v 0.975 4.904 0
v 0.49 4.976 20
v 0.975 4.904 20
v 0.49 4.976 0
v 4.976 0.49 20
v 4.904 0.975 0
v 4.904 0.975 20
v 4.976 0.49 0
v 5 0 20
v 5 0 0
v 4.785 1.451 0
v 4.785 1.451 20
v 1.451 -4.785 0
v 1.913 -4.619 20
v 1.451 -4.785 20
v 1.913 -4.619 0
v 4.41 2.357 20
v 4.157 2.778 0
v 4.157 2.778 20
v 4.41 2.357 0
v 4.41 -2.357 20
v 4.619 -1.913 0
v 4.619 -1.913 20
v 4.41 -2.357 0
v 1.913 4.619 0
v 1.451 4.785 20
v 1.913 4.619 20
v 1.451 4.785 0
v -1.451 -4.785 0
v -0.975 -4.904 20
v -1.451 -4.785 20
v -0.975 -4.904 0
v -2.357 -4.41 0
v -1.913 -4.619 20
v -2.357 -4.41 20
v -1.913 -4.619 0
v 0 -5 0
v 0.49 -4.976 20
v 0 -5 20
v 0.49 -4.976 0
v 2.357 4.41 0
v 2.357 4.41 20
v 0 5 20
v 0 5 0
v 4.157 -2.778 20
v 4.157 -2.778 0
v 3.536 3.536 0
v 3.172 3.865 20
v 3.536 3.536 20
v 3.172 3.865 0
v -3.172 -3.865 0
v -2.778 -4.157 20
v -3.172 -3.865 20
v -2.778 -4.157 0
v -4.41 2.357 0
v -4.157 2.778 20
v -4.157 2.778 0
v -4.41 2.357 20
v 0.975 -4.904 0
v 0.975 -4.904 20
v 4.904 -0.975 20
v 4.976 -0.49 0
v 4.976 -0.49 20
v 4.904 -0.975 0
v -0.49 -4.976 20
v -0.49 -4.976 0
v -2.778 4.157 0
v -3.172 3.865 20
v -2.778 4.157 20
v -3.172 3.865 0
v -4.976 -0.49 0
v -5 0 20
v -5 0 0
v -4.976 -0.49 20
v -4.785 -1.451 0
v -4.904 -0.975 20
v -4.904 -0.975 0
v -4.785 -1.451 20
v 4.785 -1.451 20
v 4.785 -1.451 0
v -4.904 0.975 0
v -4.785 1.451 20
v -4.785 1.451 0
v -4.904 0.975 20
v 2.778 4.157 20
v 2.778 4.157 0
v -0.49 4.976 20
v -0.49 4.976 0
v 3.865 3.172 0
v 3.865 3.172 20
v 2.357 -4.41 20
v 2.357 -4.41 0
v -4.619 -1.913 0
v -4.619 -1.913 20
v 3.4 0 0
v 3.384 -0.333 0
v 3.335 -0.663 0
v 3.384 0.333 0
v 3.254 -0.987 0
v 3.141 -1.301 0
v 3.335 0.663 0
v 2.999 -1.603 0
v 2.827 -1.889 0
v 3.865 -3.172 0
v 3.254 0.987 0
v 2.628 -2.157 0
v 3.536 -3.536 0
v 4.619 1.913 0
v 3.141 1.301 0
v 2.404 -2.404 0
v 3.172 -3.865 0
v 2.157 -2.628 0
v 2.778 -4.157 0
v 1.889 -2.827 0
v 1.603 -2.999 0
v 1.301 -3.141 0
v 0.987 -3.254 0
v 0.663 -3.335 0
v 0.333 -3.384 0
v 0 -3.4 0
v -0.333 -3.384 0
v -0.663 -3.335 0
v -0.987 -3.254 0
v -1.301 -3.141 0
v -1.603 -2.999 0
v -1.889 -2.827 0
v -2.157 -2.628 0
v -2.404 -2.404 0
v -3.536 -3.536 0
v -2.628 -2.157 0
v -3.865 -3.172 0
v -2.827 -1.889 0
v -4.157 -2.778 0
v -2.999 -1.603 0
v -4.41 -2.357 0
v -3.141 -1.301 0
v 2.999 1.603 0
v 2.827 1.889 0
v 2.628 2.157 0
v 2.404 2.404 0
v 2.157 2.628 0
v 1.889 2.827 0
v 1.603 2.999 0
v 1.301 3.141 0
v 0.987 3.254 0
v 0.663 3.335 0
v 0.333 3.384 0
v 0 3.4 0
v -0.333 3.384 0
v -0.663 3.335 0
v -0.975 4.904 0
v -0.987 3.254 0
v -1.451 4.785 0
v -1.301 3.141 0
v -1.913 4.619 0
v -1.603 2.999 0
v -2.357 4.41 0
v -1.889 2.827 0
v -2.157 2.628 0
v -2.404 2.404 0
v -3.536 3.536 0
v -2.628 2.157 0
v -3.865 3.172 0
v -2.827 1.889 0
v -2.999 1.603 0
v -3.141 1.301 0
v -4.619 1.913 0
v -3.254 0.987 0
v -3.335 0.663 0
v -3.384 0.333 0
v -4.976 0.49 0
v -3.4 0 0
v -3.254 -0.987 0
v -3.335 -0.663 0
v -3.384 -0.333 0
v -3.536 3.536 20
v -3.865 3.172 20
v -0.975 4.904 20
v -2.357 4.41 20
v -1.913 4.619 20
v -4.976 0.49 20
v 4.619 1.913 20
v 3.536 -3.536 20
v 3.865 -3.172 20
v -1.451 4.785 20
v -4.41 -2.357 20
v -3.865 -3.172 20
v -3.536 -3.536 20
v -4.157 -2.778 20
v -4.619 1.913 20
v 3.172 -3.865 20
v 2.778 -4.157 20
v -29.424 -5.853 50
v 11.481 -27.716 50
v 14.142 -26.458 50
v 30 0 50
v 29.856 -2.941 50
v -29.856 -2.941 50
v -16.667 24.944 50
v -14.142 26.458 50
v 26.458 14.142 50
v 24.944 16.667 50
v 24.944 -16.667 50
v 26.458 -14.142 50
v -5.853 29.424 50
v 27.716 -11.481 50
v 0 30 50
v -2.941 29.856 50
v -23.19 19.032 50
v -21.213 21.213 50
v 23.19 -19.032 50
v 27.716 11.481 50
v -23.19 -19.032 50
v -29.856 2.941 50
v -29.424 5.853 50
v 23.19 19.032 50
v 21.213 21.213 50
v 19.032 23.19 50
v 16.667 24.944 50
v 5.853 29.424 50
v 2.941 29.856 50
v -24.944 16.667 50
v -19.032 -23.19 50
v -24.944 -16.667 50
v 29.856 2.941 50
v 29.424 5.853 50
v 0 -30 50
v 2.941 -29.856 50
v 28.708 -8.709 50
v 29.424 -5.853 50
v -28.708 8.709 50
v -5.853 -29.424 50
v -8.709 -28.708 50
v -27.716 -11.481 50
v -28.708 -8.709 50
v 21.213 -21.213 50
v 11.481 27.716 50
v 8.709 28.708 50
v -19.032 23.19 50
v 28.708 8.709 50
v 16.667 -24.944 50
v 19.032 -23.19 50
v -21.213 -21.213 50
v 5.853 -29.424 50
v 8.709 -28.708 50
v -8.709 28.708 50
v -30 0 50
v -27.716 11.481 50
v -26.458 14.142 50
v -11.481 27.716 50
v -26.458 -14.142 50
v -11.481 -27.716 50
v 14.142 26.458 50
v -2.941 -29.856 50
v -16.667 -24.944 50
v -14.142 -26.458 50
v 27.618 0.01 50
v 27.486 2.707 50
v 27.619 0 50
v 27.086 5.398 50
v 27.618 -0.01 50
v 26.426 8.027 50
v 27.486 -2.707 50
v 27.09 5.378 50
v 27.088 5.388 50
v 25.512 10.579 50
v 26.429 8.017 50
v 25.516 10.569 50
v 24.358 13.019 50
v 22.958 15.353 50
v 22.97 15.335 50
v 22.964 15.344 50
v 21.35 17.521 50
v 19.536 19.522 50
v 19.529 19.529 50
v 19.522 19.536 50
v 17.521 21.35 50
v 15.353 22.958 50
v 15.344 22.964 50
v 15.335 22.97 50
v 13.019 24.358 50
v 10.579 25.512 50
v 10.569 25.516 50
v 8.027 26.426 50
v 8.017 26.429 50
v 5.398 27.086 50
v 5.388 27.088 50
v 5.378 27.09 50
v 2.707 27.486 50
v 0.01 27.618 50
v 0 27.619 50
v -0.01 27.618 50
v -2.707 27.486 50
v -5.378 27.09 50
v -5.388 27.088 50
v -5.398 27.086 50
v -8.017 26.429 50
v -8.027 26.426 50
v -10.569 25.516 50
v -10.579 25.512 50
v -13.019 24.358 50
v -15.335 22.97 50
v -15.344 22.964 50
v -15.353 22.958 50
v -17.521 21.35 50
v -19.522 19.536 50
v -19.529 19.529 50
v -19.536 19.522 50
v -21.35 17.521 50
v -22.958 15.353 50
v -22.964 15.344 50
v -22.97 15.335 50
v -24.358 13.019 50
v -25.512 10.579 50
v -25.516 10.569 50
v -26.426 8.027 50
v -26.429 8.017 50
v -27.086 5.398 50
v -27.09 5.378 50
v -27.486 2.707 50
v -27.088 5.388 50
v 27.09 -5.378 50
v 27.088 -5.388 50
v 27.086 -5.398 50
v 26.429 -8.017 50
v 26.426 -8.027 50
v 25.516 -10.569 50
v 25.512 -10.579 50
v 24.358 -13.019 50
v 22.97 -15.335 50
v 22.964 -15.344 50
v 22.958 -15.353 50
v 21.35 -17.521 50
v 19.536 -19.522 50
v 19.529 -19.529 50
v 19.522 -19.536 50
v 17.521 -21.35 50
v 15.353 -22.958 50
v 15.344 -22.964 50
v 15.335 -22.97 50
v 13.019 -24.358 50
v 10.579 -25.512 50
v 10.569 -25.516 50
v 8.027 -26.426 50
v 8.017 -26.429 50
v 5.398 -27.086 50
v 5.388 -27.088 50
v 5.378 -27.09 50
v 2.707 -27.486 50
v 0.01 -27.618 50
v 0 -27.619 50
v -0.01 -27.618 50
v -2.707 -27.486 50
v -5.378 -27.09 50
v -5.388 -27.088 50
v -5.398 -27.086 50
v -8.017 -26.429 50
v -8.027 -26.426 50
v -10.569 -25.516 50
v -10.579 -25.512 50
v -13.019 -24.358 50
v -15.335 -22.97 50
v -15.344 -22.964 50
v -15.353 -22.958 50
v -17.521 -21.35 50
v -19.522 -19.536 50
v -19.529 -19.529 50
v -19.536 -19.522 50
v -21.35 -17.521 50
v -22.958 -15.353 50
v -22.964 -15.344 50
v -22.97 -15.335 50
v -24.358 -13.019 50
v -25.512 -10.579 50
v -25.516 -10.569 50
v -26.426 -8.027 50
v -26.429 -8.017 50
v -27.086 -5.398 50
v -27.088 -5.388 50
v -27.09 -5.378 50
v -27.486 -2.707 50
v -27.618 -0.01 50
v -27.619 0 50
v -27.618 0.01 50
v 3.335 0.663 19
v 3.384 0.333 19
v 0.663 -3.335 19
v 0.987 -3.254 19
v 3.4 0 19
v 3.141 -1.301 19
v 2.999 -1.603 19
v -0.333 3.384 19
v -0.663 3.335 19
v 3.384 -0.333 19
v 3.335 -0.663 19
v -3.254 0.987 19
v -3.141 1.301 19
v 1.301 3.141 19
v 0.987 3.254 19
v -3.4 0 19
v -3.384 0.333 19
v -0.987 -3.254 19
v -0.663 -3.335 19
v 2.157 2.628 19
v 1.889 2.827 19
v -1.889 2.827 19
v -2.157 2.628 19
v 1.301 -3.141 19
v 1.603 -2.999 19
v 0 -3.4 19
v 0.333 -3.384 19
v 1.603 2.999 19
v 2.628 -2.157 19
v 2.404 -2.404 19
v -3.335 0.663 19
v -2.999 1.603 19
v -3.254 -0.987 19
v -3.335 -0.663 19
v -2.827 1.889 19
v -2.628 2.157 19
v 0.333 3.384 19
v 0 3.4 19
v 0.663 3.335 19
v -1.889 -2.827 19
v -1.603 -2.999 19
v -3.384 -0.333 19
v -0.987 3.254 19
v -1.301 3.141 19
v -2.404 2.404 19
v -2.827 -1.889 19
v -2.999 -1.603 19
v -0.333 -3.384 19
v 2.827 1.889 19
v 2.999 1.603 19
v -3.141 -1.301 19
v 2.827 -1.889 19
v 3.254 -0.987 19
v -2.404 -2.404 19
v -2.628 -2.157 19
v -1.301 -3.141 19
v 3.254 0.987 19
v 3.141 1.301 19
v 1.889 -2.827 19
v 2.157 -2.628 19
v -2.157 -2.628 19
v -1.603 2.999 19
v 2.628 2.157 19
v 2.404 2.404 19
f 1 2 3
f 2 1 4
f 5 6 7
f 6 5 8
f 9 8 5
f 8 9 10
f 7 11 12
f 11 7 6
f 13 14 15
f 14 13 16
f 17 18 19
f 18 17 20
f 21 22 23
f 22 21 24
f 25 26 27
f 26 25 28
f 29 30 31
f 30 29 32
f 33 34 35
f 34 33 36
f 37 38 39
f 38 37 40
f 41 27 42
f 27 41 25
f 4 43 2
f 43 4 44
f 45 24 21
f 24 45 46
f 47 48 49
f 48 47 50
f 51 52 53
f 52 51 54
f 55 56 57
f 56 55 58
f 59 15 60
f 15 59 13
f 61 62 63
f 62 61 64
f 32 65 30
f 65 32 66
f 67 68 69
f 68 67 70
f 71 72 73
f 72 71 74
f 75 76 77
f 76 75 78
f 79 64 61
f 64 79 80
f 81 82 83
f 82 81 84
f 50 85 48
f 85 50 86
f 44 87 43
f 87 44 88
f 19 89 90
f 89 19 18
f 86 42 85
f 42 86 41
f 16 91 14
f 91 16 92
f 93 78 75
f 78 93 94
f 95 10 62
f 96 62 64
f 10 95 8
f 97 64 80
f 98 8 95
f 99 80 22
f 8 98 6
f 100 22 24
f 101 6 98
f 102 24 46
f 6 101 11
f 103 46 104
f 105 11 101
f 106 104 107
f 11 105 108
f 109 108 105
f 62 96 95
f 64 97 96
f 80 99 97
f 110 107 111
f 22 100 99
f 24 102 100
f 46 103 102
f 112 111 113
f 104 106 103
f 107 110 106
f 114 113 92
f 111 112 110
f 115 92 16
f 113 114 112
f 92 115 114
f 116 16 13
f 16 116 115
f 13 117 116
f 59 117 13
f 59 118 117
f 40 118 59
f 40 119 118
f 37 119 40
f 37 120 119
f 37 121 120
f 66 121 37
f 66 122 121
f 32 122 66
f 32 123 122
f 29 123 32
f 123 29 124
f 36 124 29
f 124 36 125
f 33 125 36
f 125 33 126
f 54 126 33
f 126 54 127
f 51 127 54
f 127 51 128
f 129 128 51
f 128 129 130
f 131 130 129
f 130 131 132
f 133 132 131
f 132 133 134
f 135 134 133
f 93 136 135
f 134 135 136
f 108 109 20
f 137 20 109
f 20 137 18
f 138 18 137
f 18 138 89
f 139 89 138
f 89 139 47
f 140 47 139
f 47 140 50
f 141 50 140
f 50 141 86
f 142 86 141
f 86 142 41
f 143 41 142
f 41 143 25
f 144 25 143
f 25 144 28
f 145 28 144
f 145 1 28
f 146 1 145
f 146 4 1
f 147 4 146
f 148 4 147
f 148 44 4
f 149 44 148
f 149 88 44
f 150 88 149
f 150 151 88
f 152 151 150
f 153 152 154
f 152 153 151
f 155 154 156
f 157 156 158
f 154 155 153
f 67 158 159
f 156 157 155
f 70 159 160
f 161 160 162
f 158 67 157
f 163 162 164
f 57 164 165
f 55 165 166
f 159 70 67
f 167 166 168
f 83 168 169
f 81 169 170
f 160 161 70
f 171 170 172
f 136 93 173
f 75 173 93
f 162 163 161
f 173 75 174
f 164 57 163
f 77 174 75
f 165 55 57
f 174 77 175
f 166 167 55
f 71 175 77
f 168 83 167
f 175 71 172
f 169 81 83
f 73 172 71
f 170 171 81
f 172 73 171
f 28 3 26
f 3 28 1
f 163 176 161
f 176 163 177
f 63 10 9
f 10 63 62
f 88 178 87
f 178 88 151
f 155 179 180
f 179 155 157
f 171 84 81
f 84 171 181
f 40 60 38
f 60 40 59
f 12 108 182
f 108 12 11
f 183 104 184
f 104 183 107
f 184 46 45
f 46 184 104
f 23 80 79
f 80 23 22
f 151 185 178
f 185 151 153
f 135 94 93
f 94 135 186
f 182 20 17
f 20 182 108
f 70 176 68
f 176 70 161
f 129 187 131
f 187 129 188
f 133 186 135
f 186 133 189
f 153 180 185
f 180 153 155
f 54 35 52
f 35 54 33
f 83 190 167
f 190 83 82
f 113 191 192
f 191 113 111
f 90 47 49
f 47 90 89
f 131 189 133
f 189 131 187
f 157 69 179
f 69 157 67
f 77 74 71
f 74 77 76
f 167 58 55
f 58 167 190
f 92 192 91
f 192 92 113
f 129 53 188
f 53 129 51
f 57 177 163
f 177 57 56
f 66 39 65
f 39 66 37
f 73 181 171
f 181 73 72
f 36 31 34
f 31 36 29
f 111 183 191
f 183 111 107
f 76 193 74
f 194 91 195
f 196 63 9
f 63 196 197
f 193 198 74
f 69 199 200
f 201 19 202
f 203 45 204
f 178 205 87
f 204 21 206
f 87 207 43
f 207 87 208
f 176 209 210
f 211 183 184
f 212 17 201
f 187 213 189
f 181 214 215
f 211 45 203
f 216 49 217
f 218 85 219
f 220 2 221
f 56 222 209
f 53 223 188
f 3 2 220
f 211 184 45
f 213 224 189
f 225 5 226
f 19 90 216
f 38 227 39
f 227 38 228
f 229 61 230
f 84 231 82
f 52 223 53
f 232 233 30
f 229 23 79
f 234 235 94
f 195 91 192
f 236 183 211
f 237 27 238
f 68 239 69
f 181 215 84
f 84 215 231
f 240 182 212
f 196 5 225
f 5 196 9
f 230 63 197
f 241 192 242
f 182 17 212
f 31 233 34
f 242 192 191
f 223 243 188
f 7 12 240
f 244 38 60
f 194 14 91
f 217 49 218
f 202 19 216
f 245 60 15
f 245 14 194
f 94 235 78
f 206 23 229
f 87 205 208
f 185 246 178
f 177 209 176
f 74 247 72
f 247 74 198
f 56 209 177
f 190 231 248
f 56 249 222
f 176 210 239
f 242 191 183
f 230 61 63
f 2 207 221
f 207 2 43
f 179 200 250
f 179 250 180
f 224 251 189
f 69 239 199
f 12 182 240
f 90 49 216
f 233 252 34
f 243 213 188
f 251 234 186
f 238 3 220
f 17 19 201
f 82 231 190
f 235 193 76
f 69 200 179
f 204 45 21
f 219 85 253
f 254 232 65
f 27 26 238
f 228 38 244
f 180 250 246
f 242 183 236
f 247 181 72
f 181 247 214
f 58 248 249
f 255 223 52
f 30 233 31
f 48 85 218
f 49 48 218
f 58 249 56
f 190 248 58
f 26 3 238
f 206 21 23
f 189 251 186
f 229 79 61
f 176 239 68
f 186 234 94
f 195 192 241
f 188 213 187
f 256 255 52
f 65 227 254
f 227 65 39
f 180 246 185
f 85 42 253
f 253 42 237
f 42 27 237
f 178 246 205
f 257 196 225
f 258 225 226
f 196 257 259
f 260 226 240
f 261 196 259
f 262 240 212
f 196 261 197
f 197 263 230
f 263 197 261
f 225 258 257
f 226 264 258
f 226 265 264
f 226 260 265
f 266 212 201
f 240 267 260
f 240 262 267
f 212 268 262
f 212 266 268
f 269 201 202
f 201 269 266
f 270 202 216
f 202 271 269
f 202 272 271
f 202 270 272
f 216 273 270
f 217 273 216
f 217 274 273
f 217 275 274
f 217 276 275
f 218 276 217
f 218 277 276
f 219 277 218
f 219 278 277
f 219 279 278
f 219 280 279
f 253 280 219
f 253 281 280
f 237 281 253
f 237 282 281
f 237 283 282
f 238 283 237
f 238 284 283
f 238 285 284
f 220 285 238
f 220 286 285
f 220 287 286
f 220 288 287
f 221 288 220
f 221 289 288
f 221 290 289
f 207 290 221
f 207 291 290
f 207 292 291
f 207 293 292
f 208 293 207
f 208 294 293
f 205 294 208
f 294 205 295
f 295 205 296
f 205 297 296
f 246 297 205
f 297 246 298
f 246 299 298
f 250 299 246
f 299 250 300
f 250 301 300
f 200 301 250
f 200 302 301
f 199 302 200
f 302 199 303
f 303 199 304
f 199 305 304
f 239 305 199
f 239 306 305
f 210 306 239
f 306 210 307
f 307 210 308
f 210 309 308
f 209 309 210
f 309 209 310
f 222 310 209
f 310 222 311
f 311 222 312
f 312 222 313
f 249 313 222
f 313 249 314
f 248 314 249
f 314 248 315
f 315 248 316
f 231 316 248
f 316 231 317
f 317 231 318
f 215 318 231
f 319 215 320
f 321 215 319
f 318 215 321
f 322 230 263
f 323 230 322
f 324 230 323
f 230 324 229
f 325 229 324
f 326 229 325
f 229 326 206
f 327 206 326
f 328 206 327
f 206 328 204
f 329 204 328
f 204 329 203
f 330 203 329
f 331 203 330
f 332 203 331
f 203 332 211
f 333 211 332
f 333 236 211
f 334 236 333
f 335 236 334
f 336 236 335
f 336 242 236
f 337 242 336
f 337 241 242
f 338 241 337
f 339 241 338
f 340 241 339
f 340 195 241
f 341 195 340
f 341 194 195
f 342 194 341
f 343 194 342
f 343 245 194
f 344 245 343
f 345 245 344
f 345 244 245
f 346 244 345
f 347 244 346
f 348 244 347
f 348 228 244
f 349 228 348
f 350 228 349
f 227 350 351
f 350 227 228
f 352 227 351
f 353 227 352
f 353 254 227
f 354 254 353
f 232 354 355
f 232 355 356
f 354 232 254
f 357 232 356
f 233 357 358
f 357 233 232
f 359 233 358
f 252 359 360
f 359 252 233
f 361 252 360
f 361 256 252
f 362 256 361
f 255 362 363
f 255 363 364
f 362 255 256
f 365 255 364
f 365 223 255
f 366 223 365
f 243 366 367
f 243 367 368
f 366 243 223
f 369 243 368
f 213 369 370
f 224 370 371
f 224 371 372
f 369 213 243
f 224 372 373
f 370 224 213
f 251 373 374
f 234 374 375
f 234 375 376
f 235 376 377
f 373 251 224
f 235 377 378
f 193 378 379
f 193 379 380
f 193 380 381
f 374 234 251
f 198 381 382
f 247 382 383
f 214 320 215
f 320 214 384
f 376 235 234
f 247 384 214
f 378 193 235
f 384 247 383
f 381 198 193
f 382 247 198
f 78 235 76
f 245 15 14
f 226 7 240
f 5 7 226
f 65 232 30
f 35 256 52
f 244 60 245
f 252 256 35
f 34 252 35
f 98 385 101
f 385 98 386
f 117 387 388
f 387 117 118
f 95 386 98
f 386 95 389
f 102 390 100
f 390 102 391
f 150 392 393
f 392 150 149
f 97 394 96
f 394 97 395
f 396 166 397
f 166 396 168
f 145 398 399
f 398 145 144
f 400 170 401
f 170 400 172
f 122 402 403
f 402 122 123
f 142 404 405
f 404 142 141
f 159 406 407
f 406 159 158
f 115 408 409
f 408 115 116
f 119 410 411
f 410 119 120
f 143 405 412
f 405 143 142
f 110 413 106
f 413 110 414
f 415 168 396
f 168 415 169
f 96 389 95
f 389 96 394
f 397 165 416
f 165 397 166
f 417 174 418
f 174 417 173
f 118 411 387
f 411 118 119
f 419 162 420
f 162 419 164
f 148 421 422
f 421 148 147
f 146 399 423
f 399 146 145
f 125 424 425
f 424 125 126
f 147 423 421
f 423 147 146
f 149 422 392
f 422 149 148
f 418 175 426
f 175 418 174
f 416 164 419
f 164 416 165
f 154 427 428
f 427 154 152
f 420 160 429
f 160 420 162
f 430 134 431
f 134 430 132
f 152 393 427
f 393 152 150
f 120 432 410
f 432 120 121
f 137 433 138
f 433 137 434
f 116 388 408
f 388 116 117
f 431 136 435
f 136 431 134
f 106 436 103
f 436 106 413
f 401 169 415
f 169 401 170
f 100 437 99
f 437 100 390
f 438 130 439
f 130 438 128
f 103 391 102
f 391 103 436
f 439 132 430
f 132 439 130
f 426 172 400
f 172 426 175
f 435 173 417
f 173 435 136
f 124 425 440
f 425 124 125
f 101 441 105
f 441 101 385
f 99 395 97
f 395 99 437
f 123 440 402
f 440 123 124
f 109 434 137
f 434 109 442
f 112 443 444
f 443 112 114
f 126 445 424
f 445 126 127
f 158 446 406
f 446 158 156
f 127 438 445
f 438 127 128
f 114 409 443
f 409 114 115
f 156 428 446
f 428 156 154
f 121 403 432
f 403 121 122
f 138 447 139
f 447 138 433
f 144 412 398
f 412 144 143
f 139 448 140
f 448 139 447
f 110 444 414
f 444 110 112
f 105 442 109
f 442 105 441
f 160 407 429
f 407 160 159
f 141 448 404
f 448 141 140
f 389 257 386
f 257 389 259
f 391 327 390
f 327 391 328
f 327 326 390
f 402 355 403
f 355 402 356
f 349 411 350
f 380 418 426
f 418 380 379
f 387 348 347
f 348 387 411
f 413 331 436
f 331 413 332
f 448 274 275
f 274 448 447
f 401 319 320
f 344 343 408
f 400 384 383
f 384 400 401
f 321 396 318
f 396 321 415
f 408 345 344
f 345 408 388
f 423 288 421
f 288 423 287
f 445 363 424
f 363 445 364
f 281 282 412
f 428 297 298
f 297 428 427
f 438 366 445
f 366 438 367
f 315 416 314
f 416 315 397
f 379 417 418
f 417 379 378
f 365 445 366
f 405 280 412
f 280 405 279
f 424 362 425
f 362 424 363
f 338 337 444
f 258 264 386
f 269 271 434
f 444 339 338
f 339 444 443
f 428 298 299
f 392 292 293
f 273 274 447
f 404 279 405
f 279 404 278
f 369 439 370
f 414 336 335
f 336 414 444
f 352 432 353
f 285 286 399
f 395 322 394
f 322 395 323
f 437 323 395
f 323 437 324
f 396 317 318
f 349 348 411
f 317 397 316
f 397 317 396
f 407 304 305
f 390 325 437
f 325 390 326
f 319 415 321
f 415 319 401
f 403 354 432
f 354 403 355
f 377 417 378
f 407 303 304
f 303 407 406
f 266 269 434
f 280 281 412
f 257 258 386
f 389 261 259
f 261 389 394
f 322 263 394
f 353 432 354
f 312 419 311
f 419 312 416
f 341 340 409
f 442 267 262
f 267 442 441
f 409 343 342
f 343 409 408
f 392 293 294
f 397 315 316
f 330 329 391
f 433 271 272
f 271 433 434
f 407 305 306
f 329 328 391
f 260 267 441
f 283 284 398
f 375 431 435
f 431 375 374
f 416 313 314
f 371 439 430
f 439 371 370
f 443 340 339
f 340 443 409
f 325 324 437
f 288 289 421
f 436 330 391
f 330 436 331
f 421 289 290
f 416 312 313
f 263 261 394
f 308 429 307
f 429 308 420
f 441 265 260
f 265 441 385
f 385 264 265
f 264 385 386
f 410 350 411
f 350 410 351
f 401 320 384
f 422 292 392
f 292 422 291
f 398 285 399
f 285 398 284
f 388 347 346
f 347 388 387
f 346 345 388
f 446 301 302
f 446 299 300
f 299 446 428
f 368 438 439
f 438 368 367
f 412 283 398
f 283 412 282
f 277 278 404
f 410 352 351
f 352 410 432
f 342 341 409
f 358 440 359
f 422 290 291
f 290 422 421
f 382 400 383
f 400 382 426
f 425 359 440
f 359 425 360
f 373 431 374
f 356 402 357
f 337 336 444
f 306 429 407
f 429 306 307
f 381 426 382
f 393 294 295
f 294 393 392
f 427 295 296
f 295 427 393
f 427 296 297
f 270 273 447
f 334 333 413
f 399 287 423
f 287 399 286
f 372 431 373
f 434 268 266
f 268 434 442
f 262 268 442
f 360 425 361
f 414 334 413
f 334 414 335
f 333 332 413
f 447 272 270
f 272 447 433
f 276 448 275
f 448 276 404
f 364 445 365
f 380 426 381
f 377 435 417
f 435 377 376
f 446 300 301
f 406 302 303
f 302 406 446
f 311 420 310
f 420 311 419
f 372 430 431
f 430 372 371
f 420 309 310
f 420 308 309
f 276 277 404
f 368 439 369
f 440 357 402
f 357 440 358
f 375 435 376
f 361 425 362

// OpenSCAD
// Lab funnel - printed upright, open at top and bottom
// Units: mm

$fn = 64;

// --- Dimensions ---
spout_od      = 10;   // spout outer diameter (z = 0 to 20)
spout_h       = 20;   // spout height
cone_od_top   = 60;   // cone rim outer diameter (z = 50)
cone_od_bot   = 10;   // cone base outer diameter at spout junction (z = 20)
cone_h        = 30;   // cone height (z = 20 to 50)
wall          = 1.6;  // wall thickness everywhere

// --- Derived ---
spout_id      = spout_od - 2 * wall;   // bore of spout
cone_h_total  = spout_h + cone_h;      // z of rim from spout start

// --- Model ---
difference() {
    union() {
        // Spout (tube)
        cylinder(d = spout_od, h = spout_h);
        // Cone (widens from spout junction to rim)
        translate([0, 0, spout_h])
            cylinder(d1 = cone_od_bot, d2 = cone_od_top, h = cone_h);
    }
    // Through-bore: spout bore up to cone, then cone's internal cone up to rim
    translate([0, 0, -1])
        linear_extrude(height = cone_h_total + 2)
            circle(d = spout_id);
    translate([0, 0, spout_h - 1])
        cylinder(d1 = spout_id, d2 = cone_od_top - 2 * wall, h = cone_h + 2);
}
